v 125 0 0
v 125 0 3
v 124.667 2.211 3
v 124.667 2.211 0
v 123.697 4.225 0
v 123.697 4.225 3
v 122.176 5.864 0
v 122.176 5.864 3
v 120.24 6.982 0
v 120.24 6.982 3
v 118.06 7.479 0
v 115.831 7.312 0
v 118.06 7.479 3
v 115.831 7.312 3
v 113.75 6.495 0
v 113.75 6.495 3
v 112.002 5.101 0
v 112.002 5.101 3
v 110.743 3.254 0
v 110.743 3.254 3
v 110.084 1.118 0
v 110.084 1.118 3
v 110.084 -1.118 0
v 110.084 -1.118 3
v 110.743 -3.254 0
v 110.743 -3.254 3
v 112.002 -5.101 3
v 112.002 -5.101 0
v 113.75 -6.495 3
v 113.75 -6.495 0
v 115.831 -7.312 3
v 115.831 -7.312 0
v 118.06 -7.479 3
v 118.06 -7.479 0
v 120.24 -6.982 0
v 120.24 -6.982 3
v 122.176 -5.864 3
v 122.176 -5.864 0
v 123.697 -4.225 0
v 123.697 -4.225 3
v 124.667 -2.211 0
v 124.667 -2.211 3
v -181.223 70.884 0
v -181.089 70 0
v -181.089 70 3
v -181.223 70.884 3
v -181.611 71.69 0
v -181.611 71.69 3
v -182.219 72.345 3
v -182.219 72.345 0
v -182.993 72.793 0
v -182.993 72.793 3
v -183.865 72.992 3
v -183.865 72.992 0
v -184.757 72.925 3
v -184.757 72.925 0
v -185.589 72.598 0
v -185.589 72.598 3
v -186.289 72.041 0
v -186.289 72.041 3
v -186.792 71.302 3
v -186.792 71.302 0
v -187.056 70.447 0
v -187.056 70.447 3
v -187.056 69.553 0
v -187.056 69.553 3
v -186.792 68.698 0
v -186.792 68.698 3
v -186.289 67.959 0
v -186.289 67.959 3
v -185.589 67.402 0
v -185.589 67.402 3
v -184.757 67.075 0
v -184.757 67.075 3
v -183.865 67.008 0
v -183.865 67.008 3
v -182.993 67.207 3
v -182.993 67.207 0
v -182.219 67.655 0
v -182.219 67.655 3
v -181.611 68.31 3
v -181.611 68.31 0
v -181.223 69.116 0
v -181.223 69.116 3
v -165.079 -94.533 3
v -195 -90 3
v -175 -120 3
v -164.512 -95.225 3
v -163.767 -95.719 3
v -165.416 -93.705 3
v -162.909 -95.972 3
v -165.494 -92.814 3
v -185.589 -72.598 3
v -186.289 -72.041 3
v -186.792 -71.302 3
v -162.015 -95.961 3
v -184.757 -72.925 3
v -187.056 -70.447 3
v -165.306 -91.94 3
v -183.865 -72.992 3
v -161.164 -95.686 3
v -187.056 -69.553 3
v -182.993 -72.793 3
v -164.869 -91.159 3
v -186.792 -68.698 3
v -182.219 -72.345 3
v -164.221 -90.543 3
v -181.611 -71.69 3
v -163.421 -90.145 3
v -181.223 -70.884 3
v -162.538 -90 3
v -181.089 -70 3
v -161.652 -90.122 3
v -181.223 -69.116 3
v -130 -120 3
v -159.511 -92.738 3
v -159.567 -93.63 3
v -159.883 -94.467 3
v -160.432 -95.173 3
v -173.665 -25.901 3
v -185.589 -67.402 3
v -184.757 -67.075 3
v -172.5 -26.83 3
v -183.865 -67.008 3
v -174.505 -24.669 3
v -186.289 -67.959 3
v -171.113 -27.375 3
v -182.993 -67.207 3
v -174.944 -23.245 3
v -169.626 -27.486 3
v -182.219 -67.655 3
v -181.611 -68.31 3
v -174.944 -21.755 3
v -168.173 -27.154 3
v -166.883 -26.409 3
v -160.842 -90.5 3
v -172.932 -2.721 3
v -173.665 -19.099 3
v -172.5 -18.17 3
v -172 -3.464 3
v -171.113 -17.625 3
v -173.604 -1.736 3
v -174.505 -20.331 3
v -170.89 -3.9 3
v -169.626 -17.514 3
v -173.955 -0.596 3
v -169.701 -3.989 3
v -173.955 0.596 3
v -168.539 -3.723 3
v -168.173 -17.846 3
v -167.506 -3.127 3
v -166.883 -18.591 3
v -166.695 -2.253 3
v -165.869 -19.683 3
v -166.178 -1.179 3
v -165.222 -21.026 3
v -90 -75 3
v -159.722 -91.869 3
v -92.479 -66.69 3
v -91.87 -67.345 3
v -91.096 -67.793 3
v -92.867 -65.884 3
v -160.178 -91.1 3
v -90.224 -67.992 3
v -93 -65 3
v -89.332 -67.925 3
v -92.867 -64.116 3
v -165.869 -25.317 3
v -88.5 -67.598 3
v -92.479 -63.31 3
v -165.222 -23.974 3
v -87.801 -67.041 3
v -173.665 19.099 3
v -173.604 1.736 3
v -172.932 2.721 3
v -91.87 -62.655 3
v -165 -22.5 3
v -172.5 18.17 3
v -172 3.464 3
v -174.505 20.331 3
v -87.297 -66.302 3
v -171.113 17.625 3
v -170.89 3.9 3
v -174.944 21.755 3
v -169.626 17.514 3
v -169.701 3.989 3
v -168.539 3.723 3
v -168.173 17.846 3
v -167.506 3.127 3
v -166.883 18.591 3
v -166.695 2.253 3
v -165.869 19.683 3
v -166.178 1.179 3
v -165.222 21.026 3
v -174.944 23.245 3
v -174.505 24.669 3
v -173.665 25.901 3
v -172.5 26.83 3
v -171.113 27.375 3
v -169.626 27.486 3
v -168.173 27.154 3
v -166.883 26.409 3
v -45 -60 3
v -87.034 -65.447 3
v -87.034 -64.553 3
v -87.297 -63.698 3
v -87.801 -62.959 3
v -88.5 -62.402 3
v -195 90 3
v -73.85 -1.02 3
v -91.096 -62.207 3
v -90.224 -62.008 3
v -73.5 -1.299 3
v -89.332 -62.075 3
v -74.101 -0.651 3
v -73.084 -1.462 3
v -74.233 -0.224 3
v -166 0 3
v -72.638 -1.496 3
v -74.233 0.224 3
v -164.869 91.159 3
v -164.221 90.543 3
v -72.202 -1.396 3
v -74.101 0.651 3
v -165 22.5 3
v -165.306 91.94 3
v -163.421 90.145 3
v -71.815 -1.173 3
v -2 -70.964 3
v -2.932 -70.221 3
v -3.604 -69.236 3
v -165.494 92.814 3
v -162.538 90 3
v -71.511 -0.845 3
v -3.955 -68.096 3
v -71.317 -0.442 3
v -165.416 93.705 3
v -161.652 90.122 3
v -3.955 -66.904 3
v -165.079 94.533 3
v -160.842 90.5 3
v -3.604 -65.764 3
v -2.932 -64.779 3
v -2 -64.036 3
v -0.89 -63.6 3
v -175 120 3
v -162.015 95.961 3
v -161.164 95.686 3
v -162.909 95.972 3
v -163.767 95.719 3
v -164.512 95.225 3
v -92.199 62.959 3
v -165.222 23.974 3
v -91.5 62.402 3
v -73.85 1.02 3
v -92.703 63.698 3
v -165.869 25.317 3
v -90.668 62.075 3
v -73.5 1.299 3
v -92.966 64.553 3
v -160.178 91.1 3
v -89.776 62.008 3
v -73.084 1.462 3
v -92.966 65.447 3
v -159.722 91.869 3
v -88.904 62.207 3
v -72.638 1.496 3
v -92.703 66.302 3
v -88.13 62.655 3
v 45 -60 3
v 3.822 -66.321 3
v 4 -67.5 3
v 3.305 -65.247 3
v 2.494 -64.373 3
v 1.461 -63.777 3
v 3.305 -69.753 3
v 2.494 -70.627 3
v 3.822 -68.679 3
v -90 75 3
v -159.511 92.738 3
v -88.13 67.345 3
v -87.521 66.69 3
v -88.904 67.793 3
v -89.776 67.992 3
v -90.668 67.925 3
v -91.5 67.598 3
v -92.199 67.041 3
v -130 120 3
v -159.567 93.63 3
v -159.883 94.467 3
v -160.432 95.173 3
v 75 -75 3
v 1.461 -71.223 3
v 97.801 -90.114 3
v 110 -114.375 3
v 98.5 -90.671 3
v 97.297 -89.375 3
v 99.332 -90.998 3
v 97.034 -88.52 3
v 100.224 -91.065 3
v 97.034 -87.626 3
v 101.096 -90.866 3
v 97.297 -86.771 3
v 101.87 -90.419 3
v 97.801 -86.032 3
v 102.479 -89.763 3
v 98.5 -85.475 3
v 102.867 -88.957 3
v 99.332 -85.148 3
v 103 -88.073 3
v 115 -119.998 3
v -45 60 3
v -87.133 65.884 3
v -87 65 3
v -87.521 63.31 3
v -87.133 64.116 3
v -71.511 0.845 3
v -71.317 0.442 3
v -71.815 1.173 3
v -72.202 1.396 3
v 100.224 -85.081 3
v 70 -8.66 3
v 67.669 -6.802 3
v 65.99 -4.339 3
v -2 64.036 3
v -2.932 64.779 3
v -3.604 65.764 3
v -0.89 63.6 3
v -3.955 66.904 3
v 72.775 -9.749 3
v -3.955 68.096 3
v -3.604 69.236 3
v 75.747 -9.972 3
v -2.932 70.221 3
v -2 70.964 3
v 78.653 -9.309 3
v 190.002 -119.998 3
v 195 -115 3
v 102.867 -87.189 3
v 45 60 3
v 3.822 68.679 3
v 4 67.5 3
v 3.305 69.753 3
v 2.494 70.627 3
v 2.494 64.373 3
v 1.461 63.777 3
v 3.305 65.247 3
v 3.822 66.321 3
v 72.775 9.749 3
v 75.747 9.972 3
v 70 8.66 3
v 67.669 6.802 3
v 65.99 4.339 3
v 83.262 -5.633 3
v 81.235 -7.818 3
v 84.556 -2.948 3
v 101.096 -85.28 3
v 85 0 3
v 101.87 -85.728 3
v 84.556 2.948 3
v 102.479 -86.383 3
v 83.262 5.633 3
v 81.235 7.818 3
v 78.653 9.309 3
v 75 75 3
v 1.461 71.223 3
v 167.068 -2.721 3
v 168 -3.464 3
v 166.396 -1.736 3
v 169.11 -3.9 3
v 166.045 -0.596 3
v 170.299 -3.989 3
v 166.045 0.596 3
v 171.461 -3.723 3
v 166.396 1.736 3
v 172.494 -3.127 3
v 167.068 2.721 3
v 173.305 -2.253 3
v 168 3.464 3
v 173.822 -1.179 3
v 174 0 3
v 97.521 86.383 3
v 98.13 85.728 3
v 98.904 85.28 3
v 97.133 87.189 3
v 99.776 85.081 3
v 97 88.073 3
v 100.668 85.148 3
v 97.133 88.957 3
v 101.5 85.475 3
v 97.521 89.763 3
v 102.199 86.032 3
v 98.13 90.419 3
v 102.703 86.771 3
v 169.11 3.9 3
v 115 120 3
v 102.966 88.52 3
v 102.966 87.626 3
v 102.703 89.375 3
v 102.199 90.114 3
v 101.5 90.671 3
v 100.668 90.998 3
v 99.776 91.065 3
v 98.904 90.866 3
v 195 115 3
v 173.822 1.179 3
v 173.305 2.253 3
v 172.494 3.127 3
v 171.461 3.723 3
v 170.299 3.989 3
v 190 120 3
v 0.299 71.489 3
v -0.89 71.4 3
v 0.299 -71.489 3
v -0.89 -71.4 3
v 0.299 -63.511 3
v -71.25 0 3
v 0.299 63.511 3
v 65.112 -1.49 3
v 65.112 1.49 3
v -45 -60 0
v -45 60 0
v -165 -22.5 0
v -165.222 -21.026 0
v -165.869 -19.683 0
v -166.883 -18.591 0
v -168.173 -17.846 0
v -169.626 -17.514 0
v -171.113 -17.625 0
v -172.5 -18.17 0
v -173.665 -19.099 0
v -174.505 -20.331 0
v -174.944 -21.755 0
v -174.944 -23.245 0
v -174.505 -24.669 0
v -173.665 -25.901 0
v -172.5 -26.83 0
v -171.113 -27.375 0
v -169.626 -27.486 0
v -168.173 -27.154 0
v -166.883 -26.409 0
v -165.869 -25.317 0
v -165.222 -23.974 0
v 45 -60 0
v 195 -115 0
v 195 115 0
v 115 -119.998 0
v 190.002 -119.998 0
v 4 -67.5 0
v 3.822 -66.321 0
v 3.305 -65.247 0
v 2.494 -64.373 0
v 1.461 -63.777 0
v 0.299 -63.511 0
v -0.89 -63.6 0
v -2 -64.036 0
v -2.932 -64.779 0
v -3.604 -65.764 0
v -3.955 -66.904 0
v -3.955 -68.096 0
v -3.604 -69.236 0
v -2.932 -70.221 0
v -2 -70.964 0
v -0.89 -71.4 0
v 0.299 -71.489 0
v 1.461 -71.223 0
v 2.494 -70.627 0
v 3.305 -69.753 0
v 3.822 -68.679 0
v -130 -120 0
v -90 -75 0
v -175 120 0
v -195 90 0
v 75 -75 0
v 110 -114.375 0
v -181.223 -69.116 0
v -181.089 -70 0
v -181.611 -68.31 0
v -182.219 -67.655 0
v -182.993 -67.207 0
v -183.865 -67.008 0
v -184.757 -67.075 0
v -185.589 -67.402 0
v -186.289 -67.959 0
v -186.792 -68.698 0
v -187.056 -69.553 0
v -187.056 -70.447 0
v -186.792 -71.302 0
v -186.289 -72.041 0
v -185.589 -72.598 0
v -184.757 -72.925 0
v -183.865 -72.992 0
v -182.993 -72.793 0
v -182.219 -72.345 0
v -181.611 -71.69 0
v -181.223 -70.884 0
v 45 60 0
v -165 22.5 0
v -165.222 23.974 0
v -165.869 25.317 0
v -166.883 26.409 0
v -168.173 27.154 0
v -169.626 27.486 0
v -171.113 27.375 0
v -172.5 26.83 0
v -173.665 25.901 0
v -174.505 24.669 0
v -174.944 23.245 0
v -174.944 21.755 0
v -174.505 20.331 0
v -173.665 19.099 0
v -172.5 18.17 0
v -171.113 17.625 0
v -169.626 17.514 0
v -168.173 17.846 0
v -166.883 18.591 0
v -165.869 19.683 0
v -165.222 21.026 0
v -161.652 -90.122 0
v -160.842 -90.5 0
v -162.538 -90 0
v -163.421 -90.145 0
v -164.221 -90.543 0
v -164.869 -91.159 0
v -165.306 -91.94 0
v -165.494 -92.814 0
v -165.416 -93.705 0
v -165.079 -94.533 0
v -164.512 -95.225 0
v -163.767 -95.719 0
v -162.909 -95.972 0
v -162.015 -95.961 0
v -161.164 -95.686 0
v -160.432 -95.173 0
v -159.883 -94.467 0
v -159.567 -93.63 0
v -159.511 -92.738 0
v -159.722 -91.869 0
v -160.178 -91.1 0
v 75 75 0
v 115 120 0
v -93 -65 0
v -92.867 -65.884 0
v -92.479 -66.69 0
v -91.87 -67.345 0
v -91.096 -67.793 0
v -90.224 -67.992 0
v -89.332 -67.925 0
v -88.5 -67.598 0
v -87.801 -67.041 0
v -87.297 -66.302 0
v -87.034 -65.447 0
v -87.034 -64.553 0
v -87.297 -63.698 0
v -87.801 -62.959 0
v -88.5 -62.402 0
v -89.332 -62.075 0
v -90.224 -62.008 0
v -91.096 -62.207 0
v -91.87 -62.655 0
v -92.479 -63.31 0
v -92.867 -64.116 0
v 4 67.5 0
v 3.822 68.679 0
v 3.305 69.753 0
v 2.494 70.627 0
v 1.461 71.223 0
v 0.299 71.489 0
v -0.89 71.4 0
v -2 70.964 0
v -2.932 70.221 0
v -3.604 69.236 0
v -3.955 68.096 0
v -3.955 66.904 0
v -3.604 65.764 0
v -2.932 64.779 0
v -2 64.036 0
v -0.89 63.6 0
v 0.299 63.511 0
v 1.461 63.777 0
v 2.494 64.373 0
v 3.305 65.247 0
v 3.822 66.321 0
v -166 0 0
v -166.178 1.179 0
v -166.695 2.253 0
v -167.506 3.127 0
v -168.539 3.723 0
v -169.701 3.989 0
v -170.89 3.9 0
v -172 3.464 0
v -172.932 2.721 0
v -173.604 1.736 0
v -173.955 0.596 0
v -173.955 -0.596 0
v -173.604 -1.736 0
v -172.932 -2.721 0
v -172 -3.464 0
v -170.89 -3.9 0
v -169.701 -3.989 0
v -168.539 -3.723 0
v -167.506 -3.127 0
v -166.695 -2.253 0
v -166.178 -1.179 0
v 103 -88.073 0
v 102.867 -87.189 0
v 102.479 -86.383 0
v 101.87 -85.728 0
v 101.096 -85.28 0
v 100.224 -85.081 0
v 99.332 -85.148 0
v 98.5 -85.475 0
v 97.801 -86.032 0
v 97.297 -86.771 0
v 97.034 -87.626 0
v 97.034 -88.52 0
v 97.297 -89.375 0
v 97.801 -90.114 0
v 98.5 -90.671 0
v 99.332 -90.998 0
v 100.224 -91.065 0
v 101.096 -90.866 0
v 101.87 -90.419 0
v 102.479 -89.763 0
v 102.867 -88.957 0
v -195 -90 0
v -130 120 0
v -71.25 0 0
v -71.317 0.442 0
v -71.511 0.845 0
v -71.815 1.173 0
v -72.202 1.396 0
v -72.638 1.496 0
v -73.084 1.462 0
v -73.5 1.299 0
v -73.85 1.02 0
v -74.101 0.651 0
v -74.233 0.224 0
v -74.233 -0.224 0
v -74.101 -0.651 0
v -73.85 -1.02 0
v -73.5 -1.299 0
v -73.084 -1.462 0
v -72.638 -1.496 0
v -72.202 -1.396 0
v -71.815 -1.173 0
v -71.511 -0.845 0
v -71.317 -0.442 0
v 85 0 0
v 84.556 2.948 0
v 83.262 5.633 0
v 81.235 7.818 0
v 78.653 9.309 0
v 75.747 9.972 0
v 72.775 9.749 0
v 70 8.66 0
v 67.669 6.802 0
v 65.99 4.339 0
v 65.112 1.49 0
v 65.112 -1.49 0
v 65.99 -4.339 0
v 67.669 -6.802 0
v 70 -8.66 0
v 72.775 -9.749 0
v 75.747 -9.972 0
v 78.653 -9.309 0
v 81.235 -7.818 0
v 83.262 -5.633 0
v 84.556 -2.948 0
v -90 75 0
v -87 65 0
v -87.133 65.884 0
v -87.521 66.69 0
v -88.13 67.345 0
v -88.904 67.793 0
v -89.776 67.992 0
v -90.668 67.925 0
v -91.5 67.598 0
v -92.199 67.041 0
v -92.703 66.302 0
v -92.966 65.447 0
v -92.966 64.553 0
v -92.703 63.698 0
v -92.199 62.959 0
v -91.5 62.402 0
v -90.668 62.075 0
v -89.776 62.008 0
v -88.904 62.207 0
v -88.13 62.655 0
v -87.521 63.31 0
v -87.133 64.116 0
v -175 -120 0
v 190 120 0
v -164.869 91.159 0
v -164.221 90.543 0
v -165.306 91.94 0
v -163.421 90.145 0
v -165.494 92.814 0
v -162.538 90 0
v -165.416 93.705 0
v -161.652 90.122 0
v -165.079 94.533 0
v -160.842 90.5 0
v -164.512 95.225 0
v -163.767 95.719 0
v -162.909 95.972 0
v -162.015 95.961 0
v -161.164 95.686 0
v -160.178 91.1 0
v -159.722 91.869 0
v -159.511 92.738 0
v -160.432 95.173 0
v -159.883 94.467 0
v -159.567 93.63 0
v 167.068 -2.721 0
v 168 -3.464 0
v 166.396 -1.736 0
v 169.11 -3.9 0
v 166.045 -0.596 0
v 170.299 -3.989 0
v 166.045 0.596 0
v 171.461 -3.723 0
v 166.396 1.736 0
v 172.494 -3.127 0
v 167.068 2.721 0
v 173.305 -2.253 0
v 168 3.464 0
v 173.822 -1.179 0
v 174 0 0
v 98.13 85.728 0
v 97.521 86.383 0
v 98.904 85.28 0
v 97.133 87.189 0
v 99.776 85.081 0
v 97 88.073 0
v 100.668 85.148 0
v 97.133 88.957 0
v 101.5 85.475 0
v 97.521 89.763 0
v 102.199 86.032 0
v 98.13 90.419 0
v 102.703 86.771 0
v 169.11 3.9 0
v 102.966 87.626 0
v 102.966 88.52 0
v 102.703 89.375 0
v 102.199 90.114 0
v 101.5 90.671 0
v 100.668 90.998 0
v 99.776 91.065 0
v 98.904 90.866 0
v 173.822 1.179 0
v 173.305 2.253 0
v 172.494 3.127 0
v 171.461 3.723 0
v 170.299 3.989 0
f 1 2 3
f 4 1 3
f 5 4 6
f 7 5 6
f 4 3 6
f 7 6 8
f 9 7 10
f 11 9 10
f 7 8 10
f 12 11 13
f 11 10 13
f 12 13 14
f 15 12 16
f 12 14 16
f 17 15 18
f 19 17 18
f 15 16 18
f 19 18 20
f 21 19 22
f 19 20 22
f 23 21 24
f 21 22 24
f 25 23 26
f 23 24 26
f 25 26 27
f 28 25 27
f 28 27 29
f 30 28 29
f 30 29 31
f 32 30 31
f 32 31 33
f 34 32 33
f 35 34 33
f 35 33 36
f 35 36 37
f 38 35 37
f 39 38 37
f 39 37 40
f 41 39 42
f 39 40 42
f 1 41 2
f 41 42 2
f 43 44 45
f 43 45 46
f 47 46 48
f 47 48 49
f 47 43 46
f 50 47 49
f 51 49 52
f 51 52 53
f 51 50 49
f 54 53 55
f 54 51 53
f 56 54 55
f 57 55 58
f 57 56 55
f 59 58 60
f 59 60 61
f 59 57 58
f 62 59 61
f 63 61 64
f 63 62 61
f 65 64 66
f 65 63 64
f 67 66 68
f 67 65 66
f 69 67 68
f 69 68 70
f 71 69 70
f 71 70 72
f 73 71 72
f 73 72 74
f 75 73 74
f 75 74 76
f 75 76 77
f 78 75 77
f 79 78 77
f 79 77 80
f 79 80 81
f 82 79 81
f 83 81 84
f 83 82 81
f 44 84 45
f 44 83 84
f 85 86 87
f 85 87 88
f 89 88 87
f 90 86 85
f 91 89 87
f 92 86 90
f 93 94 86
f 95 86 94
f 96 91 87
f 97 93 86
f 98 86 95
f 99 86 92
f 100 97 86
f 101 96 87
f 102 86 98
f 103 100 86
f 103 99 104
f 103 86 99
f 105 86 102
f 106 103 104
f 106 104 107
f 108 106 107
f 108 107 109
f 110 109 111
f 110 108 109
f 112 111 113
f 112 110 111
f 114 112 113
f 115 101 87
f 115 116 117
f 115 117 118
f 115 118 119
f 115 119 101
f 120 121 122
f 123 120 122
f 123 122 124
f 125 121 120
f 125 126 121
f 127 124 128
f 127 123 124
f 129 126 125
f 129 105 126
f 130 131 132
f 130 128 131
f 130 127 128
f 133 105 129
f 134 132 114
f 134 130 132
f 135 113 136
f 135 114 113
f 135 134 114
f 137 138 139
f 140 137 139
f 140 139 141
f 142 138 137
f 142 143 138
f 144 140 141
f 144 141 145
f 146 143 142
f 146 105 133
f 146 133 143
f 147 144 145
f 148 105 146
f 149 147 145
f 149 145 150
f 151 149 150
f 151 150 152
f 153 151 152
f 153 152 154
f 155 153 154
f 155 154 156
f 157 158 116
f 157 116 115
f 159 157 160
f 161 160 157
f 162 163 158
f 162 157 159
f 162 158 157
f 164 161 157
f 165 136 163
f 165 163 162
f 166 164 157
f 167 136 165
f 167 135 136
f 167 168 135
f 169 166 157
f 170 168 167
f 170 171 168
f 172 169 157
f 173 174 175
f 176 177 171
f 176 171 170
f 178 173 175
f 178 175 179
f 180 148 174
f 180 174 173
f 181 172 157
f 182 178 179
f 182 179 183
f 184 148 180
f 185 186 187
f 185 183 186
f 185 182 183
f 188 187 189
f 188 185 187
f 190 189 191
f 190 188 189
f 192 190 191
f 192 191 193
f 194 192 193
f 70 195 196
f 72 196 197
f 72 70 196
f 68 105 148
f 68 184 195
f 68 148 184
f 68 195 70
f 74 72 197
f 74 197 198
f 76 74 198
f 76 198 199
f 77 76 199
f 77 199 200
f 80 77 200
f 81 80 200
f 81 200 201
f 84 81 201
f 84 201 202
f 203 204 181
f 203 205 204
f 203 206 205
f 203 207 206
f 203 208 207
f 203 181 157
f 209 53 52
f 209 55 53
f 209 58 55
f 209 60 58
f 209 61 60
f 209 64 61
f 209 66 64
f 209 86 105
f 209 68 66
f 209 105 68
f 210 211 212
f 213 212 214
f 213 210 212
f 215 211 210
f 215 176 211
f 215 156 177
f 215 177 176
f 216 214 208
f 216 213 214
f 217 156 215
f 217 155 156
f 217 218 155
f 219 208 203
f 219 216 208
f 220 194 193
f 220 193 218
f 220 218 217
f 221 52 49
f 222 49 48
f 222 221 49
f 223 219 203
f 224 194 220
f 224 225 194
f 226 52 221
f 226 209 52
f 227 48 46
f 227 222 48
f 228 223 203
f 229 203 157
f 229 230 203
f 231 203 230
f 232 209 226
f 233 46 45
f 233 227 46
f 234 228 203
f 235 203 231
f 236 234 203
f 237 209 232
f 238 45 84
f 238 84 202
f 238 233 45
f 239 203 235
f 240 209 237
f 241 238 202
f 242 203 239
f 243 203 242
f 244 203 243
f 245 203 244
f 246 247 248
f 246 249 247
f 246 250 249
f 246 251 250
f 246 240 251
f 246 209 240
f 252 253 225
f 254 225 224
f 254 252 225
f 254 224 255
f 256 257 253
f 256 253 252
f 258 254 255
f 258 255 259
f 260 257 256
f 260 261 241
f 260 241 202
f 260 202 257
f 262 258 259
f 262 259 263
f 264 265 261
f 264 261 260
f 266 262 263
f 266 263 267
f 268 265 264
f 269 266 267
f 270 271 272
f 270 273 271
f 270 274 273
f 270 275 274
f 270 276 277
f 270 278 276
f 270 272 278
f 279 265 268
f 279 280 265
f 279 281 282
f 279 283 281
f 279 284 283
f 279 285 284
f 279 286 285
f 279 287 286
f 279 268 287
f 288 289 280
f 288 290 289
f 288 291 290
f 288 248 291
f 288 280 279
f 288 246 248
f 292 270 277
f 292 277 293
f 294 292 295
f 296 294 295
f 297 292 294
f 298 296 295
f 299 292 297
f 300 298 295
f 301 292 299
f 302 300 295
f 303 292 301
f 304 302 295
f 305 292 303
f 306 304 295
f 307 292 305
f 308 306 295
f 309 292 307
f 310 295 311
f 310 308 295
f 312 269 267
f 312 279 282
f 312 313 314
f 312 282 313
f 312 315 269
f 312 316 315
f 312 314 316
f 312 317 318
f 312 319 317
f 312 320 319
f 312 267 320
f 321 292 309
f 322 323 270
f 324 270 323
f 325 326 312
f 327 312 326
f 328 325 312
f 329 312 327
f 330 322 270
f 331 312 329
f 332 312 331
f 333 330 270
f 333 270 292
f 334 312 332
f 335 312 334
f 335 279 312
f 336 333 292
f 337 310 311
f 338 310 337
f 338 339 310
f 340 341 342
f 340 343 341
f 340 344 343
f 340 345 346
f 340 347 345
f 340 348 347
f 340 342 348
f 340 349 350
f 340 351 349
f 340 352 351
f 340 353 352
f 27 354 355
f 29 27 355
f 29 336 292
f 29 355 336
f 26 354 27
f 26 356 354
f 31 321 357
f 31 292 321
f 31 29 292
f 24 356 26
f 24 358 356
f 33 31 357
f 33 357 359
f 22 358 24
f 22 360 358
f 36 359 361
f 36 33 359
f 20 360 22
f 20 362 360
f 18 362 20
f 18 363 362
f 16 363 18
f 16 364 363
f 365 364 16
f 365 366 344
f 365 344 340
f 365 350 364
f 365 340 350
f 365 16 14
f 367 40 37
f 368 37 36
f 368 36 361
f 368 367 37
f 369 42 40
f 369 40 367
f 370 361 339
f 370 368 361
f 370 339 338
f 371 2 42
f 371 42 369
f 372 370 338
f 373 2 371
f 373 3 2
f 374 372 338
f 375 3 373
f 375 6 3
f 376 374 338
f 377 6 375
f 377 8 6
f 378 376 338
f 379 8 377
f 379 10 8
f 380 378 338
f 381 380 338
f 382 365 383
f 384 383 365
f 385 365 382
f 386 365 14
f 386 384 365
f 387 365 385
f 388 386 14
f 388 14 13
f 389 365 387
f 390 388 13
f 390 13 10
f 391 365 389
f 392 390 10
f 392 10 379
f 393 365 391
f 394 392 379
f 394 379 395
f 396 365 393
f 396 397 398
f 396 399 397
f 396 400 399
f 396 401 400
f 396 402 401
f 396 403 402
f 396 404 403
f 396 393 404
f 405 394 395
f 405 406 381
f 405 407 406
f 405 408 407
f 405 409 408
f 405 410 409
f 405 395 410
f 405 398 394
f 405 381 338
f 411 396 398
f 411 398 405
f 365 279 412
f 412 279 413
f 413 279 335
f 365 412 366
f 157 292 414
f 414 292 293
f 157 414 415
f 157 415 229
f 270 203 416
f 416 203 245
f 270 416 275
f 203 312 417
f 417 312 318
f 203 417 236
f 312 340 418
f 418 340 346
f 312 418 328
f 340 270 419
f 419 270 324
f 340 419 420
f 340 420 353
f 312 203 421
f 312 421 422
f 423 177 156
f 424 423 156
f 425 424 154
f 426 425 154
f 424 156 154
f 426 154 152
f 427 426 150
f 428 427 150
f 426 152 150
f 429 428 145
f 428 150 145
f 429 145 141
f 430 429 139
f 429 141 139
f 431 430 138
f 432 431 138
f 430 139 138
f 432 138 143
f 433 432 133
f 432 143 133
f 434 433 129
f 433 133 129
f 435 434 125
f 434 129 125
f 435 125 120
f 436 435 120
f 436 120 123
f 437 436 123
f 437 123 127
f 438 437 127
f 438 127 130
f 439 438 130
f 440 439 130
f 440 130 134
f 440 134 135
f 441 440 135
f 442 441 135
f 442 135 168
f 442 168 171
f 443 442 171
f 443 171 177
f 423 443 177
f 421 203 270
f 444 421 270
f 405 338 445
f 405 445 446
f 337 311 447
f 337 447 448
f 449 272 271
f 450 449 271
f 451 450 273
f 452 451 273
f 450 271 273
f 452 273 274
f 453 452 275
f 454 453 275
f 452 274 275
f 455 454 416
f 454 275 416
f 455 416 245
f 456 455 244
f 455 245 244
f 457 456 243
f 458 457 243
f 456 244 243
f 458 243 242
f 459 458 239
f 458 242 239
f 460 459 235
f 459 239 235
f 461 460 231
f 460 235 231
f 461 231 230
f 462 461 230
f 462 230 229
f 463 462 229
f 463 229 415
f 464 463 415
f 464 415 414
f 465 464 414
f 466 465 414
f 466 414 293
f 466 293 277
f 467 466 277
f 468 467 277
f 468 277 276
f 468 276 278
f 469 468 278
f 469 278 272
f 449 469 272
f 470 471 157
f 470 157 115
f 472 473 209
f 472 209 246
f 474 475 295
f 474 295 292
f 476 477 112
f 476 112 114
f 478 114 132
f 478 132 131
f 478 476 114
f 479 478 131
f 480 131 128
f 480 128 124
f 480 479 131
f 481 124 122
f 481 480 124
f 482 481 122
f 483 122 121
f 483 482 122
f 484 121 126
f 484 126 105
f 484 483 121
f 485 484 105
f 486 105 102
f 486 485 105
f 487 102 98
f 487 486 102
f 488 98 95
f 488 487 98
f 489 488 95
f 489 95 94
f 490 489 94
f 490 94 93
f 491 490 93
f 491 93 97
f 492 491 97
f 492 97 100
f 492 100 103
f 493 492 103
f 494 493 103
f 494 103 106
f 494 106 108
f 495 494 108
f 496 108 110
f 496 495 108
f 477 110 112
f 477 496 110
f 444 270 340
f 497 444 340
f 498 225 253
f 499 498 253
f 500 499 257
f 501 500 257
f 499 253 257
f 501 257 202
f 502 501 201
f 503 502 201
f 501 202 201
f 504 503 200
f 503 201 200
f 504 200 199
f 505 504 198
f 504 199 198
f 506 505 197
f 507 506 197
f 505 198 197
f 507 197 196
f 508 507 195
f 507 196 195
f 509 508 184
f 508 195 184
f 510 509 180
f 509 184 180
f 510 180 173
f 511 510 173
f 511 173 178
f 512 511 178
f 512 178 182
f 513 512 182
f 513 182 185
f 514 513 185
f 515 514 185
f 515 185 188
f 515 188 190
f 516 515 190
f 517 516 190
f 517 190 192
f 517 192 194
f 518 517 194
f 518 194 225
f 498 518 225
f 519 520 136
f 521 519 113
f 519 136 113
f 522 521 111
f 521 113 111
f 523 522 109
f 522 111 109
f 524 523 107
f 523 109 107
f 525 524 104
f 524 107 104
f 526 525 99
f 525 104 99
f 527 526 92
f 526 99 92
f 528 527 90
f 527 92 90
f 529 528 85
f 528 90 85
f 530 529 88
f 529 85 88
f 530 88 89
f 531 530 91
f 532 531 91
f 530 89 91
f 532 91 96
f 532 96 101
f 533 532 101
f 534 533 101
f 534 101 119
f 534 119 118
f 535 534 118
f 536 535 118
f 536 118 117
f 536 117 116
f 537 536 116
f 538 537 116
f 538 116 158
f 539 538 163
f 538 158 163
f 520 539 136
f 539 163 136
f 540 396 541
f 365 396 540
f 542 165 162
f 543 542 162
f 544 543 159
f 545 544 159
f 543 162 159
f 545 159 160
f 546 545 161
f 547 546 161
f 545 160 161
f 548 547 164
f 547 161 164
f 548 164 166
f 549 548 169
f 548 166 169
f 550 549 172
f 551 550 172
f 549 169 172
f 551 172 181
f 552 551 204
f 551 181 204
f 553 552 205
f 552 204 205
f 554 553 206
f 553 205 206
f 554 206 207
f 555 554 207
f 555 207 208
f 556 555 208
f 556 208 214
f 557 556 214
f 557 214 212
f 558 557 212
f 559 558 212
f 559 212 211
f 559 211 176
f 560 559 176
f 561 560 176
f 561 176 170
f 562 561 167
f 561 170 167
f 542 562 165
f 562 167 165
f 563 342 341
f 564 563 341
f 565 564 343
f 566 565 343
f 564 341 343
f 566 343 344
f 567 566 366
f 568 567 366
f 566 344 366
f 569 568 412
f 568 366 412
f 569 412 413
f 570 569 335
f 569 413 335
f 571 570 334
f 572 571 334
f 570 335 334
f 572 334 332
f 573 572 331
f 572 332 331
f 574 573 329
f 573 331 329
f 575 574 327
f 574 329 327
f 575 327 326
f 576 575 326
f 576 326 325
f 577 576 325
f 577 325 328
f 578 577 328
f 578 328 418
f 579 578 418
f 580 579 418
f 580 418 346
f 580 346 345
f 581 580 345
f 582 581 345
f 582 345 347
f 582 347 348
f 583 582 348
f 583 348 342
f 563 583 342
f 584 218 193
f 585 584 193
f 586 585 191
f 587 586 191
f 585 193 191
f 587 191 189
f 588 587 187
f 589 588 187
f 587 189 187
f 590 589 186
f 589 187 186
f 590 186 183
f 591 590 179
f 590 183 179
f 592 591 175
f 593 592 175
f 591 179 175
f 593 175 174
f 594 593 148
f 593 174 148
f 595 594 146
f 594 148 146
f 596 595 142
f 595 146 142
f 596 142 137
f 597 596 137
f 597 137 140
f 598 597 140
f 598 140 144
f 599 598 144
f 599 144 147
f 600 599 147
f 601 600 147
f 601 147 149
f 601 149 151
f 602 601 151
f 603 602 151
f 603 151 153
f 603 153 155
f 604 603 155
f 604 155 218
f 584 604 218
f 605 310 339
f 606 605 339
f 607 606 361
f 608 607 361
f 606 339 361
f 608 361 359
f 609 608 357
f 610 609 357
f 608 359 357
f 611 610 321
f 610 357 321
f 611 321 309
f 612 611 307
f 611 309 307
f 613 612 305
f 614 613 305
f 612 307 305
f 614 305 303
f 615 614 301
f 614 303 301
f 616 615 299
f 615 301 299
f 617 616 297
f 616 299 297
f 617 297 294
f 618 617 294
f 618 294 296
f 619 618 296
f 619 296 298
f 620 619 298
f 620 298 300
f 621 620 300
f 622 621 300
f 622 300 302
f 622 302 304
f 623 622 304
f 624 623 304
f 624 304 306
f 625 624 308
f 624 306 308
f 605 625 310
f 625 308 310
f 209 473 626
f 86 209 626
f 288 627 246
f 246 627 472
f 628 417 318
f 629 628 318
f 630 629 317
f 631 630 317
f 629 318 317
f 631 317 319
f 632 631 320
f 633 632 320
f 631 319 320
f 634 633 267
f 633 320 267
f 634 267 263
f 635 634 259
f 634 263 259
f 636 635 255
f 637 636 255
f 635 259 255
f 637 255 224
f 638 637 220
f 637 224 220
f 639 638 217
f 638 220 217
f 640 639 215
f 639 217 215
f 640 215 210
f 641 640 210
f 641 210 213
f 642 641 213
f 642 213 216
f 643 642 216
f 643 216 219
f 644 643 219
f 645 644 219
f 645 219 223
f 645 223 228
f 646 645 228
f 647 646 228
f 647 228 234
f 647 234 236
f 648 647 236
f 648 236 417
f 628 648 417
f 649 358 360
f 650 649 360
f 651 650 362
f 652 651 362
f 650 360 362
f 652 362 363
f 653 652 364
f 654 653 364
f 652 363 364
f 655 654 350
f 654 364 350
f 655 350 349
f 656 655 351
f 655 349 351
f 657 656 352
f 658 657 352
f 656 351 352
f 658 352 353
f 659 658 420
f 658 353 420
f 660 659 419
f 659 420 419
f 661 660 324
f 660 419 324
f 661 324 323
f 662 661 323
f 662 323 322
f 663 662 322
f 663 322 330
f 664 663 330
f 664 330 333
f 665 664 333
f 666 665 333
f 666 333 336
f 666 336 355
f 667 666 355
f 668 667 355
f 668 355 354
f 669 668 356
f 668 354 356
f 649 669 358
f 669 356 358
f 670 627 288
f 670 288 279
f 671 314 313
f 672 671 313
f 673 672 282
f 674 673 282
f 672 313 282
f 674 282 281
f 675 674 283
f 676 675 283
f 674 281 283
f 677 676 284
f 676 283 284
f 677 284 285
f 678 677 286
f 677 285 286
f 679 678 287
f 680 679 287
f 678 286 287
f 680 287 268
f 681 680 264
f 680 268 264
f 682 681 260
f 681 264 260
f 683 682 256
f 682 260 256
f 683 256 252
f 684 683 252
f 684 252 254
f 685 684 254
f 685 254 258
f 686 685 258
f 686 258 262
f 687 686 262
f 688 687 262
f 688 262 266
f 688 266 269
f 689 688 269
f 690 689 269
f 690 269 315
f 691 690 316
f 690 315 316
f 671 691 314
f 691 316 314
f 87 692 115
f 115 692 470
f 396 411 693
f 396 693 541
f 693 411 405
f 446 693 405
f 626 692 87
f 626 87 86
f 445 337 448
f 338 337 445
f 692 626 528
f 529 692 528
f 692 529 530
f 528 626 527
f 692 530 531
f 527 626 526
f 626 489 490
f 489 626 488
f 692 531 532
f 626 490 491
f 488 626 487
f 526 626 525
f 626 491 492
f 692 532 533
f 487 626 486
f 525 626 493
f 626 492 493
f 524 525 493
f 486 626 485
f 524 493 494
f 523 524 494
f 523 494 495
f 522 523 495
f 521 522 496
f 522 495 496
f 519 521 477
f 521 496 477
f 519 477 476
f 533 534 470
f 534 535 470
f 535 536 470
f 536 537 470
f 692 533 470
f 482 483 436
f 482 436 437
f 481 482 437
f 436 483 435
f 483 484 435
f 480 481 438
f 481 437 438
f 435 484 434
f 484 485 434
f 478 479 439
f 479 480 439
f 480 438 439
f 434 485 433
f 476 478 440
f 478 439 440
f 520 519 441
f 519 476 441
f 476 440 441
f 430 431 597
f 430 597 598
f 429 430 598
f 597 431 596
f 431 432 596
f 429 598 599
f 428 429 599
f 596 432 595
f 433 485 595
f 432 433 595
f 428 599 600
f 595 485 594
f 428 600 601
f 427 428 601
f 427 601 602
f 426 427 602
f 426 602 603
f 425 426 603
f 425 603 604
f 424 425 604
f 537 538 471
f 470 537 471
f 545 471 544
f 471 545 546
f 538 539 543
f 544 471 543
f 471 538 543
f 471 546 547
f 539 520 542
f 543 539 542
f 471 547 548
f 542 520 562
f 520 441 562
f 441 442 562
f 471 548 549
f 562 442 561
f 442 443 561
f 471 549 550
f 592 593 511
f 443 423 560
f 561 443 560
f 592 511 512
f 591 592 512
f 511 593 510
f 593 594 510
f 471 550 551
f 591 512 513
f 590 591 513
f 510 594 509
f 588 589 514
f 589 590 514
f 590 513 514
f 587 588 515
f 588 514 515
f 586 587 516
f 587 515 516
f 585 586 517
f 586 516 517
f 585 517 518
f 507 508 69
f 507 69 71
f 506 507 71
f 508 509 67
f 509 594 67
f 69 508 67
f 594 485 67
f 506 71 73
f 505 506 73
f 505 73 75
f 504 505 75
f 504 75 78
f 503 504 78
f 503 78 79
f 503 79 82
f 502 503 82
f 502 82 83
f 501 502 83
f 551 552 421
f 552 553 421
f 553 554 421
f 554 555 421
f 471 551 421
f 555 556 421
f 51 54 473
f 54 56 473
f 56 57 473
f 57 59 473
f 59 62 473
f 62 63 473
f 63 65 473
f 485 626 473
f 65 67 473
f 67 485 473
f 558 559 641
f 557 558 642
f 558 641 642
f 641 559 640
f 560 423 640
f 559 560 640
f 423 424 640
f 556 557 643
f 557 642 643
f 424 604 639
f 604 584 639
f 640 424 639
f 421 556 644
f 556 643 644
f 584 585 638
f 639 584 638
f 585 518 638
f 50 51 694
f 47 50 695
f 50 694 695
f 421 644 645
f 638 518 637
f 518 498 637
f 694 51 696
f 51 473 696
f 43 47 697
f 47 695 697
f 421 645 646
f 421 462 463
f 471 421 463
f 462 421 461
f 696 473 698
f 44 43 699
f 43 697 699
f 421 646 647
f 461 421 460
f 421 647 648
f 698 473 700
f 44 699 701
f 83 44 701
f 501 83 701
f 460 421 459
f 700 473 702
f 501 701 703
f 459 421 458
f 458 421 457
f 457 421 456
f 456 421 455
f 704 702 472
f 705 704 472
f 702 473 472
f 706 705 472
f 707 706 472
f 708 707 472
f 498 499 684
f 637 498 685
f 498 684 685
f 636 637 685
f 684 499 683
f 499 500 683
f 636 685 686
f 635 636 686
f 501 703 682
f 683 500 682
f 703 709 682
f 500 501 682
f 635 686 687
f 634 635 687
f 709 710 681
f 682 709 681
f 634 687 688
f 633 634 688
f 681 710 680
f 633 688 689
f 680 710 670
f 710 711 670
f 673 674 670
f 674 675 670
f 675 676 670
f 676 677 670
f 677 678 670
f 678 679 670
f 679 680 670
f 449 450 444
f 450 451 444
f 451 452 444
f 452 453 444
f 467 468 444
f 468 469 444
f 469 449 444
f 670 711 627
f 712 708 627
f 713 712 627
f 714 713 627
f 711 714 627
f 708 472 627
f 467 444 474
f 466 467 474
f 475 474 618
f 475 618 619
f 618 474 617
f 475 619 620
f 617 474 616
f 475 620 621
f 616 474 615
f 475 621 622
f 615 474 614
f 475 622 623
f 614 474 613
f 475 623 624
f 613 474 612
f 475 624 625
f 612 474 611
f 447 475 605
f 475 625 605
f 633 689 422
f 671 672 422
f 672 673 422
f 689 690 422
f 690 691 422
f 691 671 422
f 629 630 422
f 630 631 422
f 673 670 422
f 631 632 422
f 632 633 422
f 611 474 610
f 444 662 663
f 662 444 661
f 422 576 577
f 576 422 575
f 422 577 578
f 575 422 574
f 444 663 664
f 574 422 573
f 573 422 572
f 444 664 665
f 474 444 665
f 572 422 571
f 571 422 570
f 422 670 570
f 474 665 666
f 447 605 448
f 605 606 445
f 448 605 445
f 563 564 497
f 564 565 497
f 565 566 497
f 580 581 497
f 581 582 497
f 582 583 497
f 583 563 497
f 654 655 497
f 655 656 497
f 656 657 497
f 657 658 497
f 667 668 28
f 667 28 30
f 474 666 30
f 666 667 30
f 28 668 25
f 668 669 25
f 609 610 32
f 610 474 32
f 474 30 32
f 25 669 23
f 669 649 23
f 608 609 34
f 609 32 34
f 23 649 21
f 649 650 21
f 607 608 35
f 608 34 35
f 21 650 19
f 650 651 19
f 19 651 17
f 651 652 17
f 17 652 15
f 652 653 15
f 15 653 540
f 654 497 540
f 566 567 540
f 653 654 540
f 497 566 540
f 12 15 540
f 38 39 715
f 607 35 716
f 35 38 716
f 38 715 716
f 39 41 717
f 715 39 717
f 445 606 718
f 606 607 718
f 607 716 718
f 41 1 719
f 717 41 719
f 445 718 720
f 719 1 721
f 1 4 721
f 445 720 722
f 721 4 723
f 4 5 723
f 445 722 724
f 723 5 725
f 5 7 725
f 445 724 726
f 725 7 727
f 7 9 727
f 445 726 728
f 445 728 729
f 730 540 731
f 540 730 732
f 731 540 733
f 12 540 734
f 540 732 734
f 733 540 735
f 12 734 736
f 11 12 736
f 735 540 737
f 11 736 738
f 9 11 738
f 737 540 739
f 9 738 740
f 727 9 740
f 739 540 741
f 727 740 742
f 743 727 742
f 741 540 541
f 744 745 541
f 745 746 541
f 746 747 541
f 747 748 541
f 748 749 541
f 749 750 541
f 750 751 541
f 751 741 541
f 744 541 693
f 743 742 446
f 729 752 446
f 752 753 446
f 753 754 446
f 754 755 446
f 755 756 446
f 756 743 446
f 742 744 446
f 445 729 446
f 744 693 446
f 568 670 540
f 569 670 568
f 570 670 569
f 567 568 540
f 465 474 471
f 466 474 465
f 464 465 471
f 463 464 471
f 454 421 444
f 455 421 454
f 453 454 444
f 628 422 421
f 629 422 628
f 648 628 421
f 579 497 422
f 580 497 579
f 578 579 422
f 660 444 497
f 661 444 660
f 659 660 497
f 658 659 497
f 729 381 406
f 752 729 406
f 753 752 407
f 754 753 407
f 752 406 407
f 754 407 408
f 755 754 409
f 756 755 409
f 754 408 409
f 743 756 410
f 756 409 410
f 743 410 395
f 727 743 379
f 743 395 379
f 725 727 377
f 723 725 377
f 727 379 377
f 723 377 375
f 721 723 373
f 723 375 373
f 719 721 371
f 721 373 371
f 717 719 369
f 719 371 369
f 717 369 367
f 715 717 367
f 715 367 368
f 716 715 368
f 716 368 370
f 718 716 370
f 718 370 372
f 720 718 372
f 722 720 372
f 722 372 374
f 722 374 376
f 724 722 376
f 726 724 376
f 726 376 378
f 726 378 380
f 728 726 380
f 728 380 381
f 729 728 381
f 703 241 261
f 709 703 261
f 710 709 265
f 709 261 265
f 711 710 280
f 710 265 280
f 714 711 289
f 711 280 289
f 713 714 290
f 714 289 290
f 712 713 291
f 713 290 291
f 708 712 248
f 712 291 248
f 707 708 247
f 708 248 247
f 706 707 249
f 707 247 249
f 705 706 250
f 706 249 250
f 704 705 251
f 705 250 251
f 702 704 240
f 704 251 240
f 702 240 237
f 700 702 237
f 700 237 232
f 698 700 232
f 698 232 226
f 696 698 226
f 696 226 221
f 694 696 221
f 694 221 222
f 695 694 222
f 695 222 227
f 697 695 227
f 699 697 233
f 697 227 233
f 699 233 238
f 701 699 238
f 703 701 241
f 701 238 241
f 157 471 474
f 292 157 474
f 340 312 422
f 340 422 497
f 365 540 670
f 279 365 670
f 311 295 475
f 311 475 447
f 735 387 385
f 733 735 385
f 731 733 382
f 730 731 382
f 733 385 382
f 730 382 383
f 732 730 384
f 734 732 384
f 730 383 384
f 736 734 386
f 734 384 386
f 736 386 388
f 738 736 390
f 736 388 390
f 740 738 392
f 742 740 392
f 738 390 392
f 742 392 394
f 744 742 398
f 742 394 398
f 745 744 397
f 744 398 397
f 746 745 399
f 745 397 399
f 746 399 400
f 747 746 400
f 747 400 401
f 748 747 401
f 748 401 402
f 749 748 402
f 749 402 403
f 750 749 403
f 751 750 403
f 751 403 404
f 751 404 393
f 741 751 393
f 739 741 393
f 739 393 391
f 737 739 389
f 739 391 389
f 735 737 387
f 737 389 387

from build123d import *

# Parameters (mm, degrees)
SKETCH_1_R           = 3
SKETCH_1_W           = 90
SKETCH_1_H           = 120
SKETCH_1_R_2         = 10
SKETCH_1_R_3         = 7.5
EXTRUDE_2_DEPTH      = 3
EXTRUDE_START        = -10
SKETCH_2_R           = 7.5
EXTRUDE_3_DEPTH      = 10
CUT_EXTRUDE_1_DEPTH  = 10
EXTRUDE_START_2      = -3
SKETCH_4_R           = 10
EXTRUDE_4_DEPTH      = 3
SKETCH_6_W           = 7
SKETCH_6_H           = 14.142135624
CUT_EXTRUDE_5_DEPTH  = 333.489097566
SKETCH_7_W           = 90
SKETCH_7_H           = 120
EXTRUDE_5_DEPTH      = 3
SKETCH_8_W           = 10
SKETCH_8_H           = 50
EXTRUDE_6_DEPTH      = 30
SKETCH_9_R           = 8
CUT_EXTRUDE_6_DEPTH  = 30
SKETCH_10_R          = 3
EXTRUDE_7_DEPTH      = 3
SKETCH_11_R          = 3
CUT_EXTRUDE_7_DEPTH  = 3
SKETCH_12_R          = 3
EXTRUDE_8_DEPTH      = 3
SKETCH_13_R          = 3
CUT_EXTRUDE_8_DEPTH  = 3
SKETCH_14_R          = 3
CUT_EXTRUDE_9_DEPTH  = 10
SKETCH_15_R          = 3
CUT_EXTRUDE_10_DEPTH = 231.922064775
SKETCH_16_R          = 3
EXTRUDE_10_DEPTH     = 3
SKETCH_17_R          = 3
CUT_EXTRUDE_11_DEPTH = 231.922064775
SKETCH_18_R          = 5
CUT_EXTRUDE_12_DEPTH = 10
SKETCH_19_W          = 30
SKETCH_19_H          = 50
CUT_EXTRUDE_13_DEPTH = 10
EXTRUDE_11_DEPTH     = 3
EXTRUDE_12_DEPTH     = 3
CUT_EXTRUDE_14_DEPTH = 3
SKETCH_23_W          = 90
SKETCH_23_H          = 120
CUT_EXTRUDE_15_DEPTH = 3
SKETCH_24_R          = 10
SKETCH_24_R_2        = 7.5
CUT_EXTRUDE_16_DEPTH = 3
SKETCH_25_R          = 1.5
CUT_EXTRUDE_17_DEPTH = 10
SKETCH_26_R          = 4
CUT_EXTRUDE_18_DEPTH = 10
SKETCH_27_R          = 4
CUT_EXTRUDE_19_DEPTH = 10


with BuildPart() as part:
    # 草图1 → 凸台-拉伸2 (new body)
    # profile 1 of 9: a face of its own
    with BuildSketch(Plane.XY):
        Polygon((195, -115), (195, 115), (190, 115), (190, 120), (115, 120), (115, 75), (75, 75), (-90, 75), (-130, 75), (-130, 120), (-175, 120), (-175, 90), (-195, 90), (-195, -90), (-175, -90), (-175, -120), (-130, -120), (-130, -75), (-90, -75), (75, -75), (115, -75), (115, -120), (190, -120), (190, -115), align=None)
        with Locations((-184.089468205, -70)):
            Circle(SKETCH_1_R, mode=Mode.SUBTRACT)
        with Locations((-87, -69)):
            Circle(SKETCH_1_R, mode=Mode.SUBTRACT)
        with Locations((-184.089468205, 70)):
            Circle(SKETCH_1_R, mode=Mode.SUBTRACT)
        with Locations((-87, 69)):
            Circle(SKETCH_1_R, mode=Mode.SUBTRACT)
        Rectangle(SKETCH_1_W, SKETCH_1_H, mode=Mode.SUBTRACT)
        with Locations((75, 0)):
            Circle(SKETCH_1_R_2, mode=Mode.SUBTRACT)
        with Locations((117.5, 0)):
            Circle(SKETCH_1_R_3, mode=Mode.SUBTRACT)
    # profile 2 of 9: a face of its own
    with BuildSketch(Plane.XY):
        Polygon((-130, 120), (-90, 75), (-130, 75), align=None)
    # profile 3 of 9: a face of its own
    with BuildSketch(Plane.XY):
        Polygon((-175, 120), (-175, 90), (-195, 90), align=None)
    # profile 4 of 9: a face of its own
    with BuildSketch(Plane.XY):
        Polygon((-175, -120), (-195, -90), (-175, -90), align=None)
    # profile 5 of 9: a face of its own
    with BuildSketch(Plane.XY):
        Polygon((-130, -120), (-130, -75), (-90, -75), align=None)
    # profile 6 of 9: a face of its own
    with BuildSketch(Plane.XY):
        Polygon((115, -120), (75, -75), (115, -75), align=None)
        with Locations((104.379549532, -93)):
            Circle(SKETCH_1_R, mode=Mode.SUBTRACT)
    # profile 7 of 9: a face of its own
    with BuildSketch(Plane.XY):
        Polygon((115, 120), (115, 75), (75, 75), align=None)
        with Locations((104.379549532, 93)):
            Circle(SKETCH_1_R, mode=Mode.SUBTRACT)
    # profile 8 of 9: a face of its own
    with BuildSketch(Plane.XY):
        Polygon((190, 120), (195, 115), (190, 115), align=None)
    # profile 9 of 9: a face of its own
    with BuildSketch(Plane.XY):
        Polygon((190, -115), (190, -120), (195, -115), align=None)
    extrude(amount=EXTRUDE_2_DEPTH)

    # 草图2 → 凸台-拉伸3 (add)
    with BuildSketch(Plane.XY.offset(3).offset(EXTRUDE_START)):
        with Locations((117.5, 0)):
            Circle(SKETCH_2_R)
    extrude(amount=EXTRUDE_3_DEPTH)

    # 草图3 → 切除-拉伸1 (cut)
    with BuildSketch(Plane.XY.offset(3)):
        Polygon((115, 120), (115, -120), (190, -120), (195, -115), (195, 115), (190, 120), align=None)
        Polygon((115, -120), (115, -114.375), (110, -114.375), align=None)
        Polygon((115, 114.376866735), (115, 120), (110.00165932, 114.376866735), align=None)
    extrude(amount=-CUT_EXTRUDE_1_DEPTH, mode=Mode.SUBTRACT)

    # 草图4 → 凸台-拉伸4 (add)
    with BuildSketch(Plane.XY.offset(3).offset(EXTRUDE_START_2)):
        with Locations((75, 0)):
            Circle(SKETCH_4_R)
    extrude(amount=EXTRUDE_4_DEPTH)

    # 草图6 → 切除-拉伸5 (cut, through all)
    with BuildSketch(Plane(origin=(115, 0, 0), x_dir=(0, 0, -1), z_dir=(1, 0, 0))):
        with Locations((3.5, 0)):
            Rectangle(SKETCH_6_W, SKETCH_6_H)
    extrude(amount=-CUT_EXTRUDE_5_DEPTH, mode=Mode.SUBTRACT)

    # 草图7 → 凸台-拉伸5 (add)
    with BuildSketch(Plane.XY.offset(3)):
        Rectangle(SKETCH_7_W, SKETCH_7_H)
    extrude(amount=-EXTRUDE_5_DEPTH)

    # 草图8 → 凸台-拉伸6 (add)
    with BuildSketch(Plane.XY.offset(3)):
        with Locations((110, 0)):
            Rectangle(SKETCH_8_W, SKETCH_8_H)
    extrude(amount=EXTRUDE_6_DEPTH)

    # 草图9 → 切除-拉伸6 (cut)
    with BuildSketch(Plane(origin=(115, 0, 0), x_dir=(0, 0, -1), z_dir=(1, 0, 0))):
        with Locations((-17.93158575, 0)):
            Circle(SKETCH_9_R)
    extrude(amount=-CUT_EXTRUDE_6_DEPTH, mode=Mode.SUBTRACT)

    # 草图10 → 凸台-拉伸7 (add)
    with BuildSketch(Plane.XY.offset(3).offset(EXTRUDE_START_2)):
        with Locations((104.379549532, -93)):
            Circle(SKETCH_10_R)
        with Locations((104.379549532, 93)):
            Circle(SKETCH_10_R)
    extrude(amount=EXTRUDE_7_DEPTH)

    # 草图11 → 切除-拉伸7 (cut)
    with BuildSketch(Plane.XY.offset(3)):
        with Locations((100, -88.073006777)):
            Circle(SKETCH_11_R)
        with Locations(Location((100, 88.073006777, 0), (0, 0, 180))):
            Circle(SKETCH_11_R)
    extrude(amount=-CUT_EXTRUDE_7_DEPTH, mode=Mode.SUBTRACT)

    # 草图12 → 凸台-拉伸8 (add)
    with BuildSketch(Plane.XY.offset(3).offset(EXTRUDE_START_2)):
        with Locations((-87, 69)):
            Circle(SKETCH_12_R)
        with Locations((-87, -69)):
            Circle(SKETCH_12_R)
    extrude(amount=EXTRUDE_8_DEPTH)

    # 草图13 → 切除-拉伸8 (cut)
    with BuildSketch(Plane.XY.offset(3)):
        with Locations((-90, 65)):
            Circle(SKETCH_13_R)
        with Locations(Location((-90, -65, 0), (0, 0, 180))):
            Circle(SKETCH_13_R)
    extrude(amount=-CUT_EXTRUDE_8_DEPTH, mode=Mode.SUBTRACT)

    # 草图14 → 切除-拉伸9 (cut)
    with BuildSketch(Plane.XY.offset(3)):
        with BuildLine():
            ThreePointArc((-159.5, 88), (-160.378679656, 90.121320344), (-162.5, 91))
            Line((-162.5, 91), (-162.5, 85))
            ThreePointArc((-162.5, 85), (-160.378679656, 85.878679656), (-159.5, 88))
        make_face()
        with BuildLine():
            Line((-162.5, 85), (-162.5, 91))
            ThreePointArc((-162.5, 91), (-165.5, 88), (-162.5, 85))
        make_face()
        with Locations((-162.5, -88)):
            Circle(SKETCH_14_R)
    extrude(amount=-CUT_EXTRUDE_9_DEPTH, mode=Mode.SUBTRACT)

    # 草图15 → 切除-拉伸10 (cut, through all)
    with BuildSketch(Plane.XY.offset(3)):
        with Locations((-162.5, -93)):
            Circle(SKETCH_15_R)
        with Locations((-162.5, -88)):
            Circle(SKETCH_15_R)
        with Locations((-162.5, 93)):
            Circle(SKETCH_15_R)
        with Locations((-162.5, 88)):
            Circle(SKETCH_15_R)
    extrude(amount=-CUT_EXTRUDE_10_DEPTH, mode=Mode.SUBTRACT)

    # 草图16 → 凸台-拉伸10 (add)
    with BuildSketch(Plane.XY.offset(3)):
        with Locations((-162.5, 88)):
            Circle(SKETCH_16_R)
        with Locations((-162.5, -88)):
            Circle(SKETCH_16_R)
    extrude(amount=-EXTRUDE_10_DEPTH)

    # 草图17 → 切除-拉伸11 (cut, through all)
    with BuildSketch(Plane.XY.offset(3)):
        with Locations((-162.5, 93)):
            Circle(SKETCH_17_R)
        with Locations((-162.5, -93)):
            Circle(SKETCH_17_R)
    extrude(amount=-CUT_EXTRUDE_11_DEPTH, mode=Mode.SUBTRACT)

    # 草图18 → 切除-拉伸12 (cut)
    with BuildSketch(Plane.XY.offset(3)):
        with Locations((-170, 22.5)):
            Circle(SKETCH_18_R)
        with Locations((-170, -22.5)):
            Circle(SKETCH_18_R)
    extrude(amount=-CUT_EXTRUDE_12_DEPTH, mode=Mode.SUBTRACT)

    # 草图19 → 切除-拉伸13 (cut)
    with BuildSketch(Plane.ZY.offset(-105)):
        with Locations((18, 0)):
            Rectangle(SKETCH_19_W, SKETCH_19_H)
    extrude(amount=-CUT_EXTRUDE_13_DEPTH, mode=Mode.SUBTRACT)

    # 草图20 → 凸台-拉伸11 (add)
    with BuildSketch(Plane.XY.offset(3)):
        Polygon((195, 0.000933368), (115, 0.000933368), (115, -114.375), (115, -119.998133265), (195, -119.998133265), align=None)
        Polygon((115, 120), (115, 114.376866735), (115, 0.000933368), (195, 0.000933368), (195, 120), align=None)
    extrude(amount=-EXTRUDE_11_DEPTH)

    # 草图21 → 凸台-拉伸12 (add)
    with BuildSketch(Plane.XY.offset(3)):
        Polygon((115, 120), (110.00165932, 114.376866735), (115, 114.376866735), align=None)
        Polygon((110, -114.375), (115, -119.998133265), (115, -114.375), align=None)
    extrude(amount=-EXTRUDE_12_DEPTH)

    # 草图22 → 切除-拉伸14 (cut)
    with BuildSketch(Plane.XY.offset(3)):
        Polygon((195, 115), (195, 120), (190, 120), align=None)
        Polygon((195, -120), (190, -120), (195, -115), align=None)
    extrude(amount=-CUT_EXTRUDE_14_DEPTH, mode=Mode.SUBTRACT)

    # 草图23 → 切除-拉伸15 (cut)
    with BuildSketch(Plane.XY.offset(3)):
        Rectangle(SKETCH_23_W, SKETCH_23_H)
    extrude(amount=-CUT_EXTRUDE_15_DEPTH, mode=Mode.SUBTRACT)

    # 草图24 → 切除-拉伸16 (cut)
    with BuildSketch(Plane.XY.offset(3)):
        with Locations((75, 0)):
            Circle(SKETCH_24_R)
        with Locations((117.5, 0)):
            Circle(SKETCH_24_R_2)
    extrude(amount=-CUT_EXTRUDE_16_DEPTH, mode=Mode.SUBTRACT)

    # 草图25 → 切除-拉伸17 (cut)
    with BuildSketch(Plane.XY.offset(3)):
        with Locations((-72.75, 0)):
            Circle(SKETCH_25_R)
    extrude(amount=-CUT_EXTRUDE_17_DEPTH, mode=Mode.SUBTRACT)

    # 草图26 → 切除-拉伸18 (cut)
    with BuildSketch(Plane.XY.offset(3)):
        with Locations((-170, 0)):
            Circle(SKETCH_26_R)
    extrude(amount=-CUT_EXTRUDE_18_DEPTH, mode=Mode.SUBTRACT)

    # 草图27 → 切除-拉伸19 (cut)
    with BuildSketch(Plane.XY.offset(3)):
        with Locations((0, -67.5)):
            Circle(SKETCH_27_R)
        with Locations((0, 67.5)):
            Circle(SKETCH_27_R)
        with Locations((-170, 0)):
            Circle(SKETCH_27_R)
        with Locations((170, 0)):
            Circle(SKETCH_27_R)
    extrude(amount=-CUT_EXTRUDE_19_DEPTH, mode=Mode.SUBTRACT)


solid = part.part
